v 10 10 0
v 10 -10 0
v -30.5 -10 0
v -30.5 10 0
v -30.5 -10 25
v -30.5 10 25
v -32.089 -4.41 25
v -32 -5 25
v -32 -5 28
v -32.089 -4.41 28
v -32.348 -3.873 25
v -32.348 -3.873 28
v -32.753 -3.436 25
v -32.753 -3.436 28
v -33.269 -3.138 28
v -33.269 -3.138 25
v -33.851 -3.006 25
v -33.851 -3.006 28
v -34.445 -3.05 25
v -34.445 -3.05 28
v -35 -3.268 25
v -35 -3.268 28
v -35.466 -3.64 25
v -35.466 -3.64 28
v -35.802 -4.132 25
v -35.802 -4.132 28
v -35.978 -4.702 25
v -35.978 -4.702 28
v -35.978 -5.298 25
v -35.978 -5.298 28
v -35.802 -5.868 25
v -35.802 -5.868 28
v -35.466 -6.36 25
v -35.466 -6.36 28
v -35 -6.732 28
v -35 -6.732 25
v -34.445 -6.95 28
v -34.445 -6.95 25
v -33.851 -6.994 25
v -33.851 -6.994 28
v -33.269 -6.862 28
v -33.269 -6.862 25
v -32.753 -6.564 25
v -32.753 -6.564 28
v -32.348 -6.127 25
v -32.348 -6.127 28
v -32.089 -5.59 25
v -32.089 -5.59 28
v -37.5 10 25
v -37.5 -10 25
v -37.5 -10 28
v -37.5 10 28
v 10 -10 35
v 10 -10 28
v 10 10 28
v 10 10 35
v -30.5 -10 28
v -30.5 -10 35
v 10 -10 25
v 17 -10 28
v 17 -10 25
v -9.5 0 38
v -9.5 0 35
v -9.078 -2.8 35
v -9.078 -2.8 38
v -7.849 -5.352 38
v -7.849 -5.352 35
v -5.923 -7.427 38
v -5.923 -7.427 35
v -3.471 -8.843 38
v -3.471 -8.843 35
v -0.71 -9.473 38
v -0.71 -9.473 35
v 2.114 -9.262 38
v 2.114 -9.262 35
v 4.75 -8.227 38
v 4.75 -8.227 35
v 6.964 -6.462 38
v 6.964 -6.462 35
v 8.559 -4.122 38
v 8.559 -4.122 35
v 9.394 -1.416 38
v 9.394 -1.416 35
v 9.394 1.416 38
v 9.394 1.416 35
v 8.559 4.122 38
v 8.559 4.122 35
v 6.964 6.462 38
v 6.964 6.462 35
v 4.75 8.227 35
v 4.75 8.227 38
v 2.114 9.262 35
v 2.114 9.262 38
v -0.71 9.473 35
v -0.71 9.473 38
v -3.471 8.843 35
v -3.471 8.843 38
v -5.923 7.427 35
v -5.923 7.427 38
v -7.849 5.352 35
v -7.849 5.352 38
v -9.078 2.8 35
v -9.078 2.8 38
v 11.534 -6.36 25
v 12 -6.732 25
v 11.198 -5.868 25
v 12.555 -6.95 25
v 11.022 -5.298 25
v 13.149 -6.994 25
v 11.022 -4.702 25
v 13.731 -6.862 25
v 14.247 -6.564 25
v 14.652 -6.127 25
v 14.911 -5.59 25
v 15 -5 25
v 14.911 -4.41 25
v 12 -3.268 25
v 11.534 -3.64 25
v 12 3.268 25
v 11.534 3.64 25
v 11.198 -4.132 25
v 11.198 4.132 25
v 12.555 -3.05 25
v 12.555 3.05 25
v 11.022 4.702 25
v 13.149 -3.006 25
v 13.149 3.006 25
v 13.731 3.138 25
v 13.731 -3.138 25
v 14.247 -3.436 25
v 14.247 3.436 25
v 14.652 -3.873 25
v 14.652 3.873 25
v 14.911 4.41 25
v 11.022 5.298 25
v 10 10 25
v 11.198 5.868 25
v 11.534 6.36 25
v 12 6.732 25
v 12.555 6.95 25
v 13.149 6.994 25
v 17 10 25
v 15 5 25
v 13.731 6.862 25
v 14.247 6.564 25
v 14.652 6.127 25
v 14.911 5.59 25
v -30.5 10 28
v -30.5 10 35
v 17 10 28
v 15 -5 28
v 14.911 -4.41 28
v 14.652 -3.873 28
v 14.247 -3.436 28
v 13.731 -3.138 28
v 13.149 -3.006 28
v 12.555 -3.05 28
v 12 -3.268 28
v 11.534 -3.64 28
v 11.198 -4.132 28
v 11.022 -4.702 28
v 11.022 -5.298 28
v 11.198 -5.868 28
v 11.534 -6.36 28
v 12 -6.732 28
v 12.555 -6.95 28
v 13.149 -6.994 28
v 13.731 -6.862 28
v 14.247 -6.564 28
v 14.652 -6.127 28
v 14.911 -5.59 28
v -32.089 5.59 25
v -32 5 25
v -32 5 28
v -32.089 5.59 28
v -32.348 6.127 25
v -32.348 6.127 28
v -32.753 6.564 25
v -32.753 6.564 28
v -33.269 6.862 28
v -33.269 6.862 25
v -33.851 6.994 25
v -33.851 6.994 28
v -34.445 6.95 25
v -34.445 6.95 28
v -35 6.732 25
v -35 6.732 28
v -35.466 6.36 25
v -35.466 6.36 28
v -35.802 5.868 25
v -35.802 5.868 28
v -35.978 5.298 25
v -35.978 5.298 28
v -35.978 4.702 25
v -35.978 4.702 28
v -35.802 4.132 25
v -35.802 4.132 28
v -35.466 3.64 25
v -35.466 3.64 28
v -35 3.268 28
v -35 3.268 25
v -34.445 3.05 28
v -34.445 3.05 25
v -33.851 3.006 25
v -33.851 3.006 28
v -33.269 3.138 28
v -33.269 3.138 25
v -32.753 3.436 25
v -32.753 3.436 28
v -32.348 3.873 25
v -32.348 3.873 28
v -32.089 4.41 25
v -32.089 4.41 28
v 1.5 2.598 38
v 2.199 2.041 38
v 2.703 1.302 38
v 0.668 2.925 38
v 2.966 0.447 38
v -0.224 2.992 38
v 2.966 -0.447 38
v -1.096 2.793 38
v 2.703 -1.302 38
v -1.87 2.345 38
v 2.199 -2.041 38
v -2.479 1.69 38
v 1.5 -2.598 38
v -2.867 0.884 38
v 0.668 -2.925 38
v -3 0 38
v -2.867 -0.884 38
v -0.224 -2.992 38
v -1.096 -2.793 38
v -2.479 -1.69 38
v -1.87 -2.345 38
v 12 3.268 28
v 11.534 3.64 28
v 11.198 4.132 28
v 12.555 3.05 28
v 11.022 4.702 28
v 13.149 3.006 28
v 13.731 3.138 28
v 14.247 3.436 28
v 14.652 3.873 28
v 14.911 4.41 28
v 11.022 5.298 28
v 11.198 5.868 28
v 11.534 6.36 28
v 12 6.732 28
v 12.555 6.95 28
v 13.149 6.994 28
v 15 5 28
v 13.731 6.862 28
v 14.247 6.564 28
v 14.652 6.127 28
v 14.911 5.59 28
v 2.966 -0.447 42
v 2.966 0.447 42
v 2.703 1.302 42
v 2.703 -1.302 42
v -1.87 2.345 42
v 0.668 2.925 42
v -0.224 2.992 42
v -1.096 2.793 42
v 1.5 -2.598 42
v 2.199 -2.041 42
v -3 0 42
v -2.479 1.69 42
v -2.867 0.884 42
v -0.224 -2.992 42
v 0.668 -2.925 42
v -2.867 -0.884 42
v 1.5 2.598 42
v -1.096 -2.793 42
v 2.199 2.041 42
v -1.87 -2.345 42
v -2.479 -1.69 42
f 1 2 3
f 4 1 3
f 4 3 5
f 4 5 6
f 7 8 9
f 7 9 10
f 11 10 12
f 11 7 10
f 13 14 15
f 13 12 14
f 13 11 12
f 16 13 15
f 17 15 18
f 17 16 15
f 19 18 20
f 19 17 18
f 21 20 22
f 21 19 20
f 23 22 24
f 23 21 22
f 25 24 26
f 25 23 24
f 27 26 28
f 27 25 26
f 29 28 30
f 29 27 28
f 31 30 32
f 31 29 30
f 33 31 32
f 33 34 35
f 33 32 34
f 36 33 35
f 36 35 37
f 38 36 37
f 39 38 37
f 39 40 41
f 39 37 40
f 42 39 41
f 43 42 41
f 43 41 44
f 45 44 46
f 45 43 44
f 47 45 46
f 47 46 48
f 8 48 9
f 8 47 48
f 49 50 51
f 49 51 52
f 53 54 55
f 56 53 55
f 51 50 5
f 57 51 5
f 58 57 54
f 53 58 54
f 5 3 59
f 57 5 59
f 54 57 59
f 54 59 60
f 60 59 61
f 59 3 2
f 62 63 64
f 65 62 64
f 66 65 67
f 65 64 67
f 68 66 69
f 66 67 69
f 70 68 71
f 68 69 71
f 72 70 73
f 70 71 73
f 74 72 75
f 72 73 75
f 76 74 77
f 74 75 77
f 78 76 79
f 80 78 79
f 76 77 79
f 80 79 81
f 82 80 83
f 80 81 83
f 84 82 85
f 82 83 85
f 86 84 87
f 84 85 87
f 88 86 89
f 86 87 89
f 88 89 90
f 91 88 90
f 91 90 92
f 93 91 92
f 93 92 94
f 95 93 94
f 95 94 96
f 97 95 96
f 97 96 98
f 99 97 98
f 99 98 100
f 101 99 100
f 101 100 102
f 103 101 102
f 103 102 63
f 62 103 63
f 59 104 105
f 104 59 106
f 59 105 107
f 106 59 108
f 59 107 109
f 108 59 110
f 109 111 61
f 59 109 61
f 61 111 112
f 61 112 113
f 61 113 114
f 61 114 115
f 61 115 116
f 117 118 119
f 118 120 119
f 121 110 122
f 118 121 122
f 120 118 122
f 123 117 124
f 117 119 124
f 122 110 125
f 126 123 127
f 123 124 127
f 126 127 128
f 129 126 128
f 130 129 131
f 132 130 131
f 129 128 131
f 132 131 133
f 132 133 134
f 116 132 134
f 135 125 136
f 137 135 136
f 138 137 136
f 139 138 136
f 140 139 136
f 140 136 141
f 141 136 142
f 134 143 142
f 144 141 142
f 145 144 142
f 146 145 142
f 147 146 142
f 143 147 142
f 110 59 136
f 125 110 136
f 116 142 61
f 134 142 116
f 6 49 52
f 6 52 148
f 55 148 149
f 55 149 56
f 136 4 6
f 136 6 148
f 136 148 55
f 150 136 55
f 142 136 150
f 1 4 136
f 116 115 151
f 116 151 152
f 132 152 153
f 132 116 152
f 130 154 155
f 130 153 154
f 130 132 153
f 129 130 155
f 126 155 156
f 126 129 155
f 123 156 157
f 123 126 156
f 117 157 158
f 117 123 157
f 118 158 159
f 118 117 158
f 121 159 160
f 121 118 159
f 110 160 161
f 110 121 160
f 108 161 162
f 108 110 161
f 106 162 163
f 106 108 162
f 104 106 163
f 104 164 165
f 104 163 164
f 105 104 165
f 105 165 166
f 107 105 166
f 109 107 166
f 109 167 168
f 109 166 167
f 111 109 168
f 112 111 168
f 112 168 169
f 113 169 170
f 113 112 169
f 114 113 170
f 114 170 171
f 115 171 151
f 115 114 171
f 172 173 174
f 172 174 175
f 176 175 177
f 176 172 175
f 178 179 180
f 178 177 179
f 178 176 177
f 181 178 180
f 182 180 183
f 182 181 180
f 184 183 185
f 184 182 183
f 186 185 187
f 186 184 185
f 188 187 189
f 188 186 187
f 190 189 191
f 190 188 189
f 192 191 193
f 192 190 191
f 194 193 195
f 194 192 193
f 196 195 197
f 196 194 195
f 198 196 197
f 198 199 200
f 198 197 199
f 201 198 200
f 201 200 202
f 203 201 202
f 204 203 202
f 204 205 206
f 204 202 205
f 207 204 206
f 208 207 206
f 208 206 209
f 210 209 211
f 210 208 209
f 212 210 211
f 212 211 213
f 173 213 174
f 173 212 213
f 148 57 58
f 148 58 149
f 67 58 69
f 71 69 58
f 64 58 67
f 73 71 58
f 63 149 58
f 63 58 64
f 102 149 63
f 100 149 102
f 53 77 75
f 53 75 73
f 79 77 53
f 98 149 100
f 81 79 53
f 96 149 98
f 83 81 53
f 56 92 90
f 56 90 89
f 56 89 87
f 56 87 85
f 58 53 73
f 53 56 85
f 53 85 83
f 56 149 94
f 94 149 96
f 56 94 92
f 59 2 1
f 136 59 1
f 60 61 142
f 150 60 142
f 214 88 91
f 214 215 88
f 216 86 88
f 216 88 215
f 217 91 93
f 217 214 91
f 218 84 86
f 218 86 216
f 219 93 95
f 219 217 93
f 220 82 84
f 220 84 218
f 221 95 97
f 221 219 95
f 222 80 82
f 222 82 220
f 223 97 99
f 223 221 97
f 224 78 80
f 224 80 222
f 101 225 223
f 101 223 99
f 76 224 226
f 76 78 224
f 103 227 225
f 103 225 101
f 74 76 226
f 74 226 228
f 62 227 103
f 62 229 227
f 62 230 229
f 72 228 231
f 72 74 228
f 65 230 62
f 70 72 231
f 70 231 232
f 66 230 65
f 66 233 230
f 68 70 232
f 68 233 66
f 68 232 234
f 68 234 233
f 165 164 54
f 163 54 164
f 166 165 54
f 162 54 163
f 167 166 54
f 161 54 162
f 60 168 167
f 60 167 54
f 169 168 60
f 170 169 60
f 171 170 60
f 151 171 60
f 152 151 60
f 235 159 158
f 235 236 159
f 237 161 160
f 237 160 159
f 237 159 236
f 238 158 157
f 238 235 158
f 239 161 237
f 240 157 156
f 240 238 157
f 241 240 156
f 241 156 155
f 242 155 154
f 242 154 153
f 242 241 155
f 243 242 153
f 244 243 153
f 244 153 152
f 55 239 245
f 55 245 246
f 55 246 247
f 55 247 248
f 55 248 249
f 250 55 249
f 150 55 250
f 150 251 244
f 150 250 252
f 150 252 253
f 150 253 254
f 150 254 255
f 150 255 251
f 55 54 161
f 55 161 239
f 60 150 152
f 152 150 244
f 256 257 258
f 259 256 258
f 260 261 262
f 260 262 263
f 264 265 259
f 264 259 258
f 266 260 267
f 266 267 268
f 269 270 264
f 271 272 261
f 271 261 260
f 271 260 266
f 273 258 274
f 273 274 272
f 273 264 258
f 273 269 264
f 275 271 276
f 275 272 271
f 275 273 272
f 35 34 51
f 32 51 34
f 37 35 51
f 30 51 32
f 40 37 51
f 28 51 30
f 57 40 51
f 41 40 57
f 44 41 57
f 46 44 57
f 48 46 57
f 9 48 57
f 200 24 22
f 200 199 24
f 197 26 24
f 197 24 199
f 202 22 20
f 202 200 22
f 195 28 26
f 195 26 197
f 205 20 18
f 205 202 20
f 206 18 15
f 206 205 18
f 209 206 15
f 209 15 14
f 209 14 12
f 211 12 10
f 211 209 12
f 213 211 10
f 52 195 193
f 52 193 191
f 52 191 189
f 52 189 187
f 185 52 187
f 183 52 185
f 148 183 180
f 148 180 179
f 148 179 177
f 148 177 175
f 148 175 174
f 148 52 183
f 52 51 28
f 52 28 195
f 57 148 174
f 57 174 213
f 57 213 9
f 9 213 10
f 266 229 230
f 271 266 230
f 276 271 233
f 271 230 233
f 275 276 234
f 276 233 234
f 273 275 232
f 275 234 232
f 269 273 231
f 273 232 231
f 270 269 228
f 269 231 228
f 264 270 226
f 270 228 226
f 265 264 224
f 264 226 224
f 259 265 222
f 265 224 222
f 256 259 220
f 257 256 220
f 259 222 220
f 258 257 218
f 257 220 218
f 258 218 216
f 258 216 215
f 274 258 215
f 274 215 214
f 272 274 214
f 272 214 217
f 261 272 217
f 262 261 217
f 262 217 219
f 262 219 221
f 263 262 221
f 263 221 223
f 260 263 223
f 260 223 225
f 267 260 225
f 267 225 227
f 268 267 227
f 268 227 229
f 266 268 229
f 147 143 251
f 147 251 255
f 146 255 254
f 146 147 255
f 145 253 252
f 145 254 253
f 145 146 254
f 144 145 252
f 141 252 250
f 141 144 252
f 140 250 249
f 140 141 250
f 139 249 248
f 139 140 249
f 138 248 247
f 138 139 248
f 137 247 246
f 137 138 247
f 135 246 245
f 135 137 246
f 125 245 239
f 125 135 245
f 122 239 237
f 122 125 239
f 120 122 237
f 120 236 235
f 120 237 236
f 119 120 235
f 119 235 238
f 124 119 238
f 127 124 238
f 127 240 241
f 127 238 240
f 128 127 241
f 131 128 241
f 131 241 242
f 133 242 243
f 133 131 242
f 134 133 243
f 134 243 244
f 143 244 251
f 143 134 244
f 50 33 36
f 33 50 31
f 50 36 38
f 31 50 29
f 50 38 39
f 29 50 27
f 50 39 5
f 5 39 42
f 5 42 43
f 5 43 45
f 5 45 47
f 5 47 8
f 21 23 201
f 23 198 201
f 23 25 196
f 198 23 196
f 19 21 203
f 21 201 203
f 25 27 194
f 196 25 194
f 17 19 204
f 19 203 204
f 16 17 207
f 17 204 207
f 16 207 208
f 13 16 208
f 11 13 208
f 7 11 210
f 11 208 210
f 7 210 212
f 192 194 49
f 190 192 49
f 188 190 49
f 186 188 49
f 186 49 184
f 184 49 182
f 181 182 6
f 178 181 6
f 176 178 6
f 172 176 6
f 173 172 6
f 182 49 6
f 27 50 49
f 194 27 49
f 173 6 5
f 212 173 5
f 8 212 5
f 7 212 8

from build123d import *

# Parameters (mm, degrees)
SKETCH_1_W                            = 40.5
SKETCH_1_H                            = 20
MG995_CASE_PHOTO_APPROX35_DEPTH       = 35
MOUNTING_EARS_APPROX54P5_START        = 25
SKETCH_2_W                            = 54.5
SKETCH_2_H                            = 20
MOUNTING_EARS_APPROX54P5_DEPTH        = 3
SKETCH_3_R                            = 9.5
RAISED_COVER_APPROX_DEPTH             = 38
SKETCH_4_R                            = 3
OUTPUT_SHAFT_ENVELOPE_NO_SPLINE_DEPTH = 42
EAR_HOLES_REFERENCE_47X10_DEPTH       = 58.18609971
EAR_HOLES_REFERENCE_47X10_DEPTH_BACK  = 58.18609971
SKETCH_5_R                            = 2


with BuildPart() as part:
    # 草图1 → MG995_case_photo_approx35 (new body)
    with BuildSketch(Plane.XY):
        with Locations((-10.25, 0)):
            Rectangle(SKETCH_1_W, SKETCH_1_H)
    extrude(amount=MG995_CASE_PHOTO_APPROX35_DEPTH)

    # 草图2 → Mounting_ears_APPROX54p5 (add)
    with BuildSketch(Plane.XY.offset(MOUNTING_EARS_APPROX54P5_START)):
        with Locations((-10.25, 0)):
            Rectangle(SKETCH_2_W, SKETCH_2_H)
    extrude(amount=MOUNTING_EARS_APPROX54P5_DEPTH)

    # 草图3 → Raised_cover_APPROX (add)
    with BuildSketch(Plane.XY):
        with Locations(Location((0, 0, 0), (0, 0, 180))):
            Circle(SKETCH_3_R)
    extrude(amount=RAISED_COVER_APPROX_DEPTH)

    # 草图4 → Output_shaft_envelope_NO_SPLINE (add)
    with BuildSketch(Plane.XY):
        with Locations(Location((0, 0, 0), (0, 0, 180))):
            Circle(SKETCH_4_R)
    extrude(amount=OUTPUT_SHAFT_ENVELOPE_NO_SPLINE_DEPTH)

    # 草图5 → Ear_holes_REFERENCE_47x10 (cut, two sides: drawn at the far end of the back side and taken through both)
    with BuildSketch(Plane.XY.offset(-EAR_HOLES_REFERENCE_47X10_DEPTH_BACK)):
        with Locations((-34, -5)):
            Circle(SKETCH_5_R)
        with Locations((-34, 5)):
            Circle(SKETCH_5_R)
        with Locations((13, -5)):
            Circle(SKETCH_5_R)
        with Locations((13, 5)):
            Circle(SKETCH_5_R)
    extrude(amount=EAR_HOLES_REFERENCE_47X10_DEPTH + EAR_HOLES_REFERENCE_47X10_DEPTH_BACK, mode=Mode.SUBTRACT)


solid = part.part
